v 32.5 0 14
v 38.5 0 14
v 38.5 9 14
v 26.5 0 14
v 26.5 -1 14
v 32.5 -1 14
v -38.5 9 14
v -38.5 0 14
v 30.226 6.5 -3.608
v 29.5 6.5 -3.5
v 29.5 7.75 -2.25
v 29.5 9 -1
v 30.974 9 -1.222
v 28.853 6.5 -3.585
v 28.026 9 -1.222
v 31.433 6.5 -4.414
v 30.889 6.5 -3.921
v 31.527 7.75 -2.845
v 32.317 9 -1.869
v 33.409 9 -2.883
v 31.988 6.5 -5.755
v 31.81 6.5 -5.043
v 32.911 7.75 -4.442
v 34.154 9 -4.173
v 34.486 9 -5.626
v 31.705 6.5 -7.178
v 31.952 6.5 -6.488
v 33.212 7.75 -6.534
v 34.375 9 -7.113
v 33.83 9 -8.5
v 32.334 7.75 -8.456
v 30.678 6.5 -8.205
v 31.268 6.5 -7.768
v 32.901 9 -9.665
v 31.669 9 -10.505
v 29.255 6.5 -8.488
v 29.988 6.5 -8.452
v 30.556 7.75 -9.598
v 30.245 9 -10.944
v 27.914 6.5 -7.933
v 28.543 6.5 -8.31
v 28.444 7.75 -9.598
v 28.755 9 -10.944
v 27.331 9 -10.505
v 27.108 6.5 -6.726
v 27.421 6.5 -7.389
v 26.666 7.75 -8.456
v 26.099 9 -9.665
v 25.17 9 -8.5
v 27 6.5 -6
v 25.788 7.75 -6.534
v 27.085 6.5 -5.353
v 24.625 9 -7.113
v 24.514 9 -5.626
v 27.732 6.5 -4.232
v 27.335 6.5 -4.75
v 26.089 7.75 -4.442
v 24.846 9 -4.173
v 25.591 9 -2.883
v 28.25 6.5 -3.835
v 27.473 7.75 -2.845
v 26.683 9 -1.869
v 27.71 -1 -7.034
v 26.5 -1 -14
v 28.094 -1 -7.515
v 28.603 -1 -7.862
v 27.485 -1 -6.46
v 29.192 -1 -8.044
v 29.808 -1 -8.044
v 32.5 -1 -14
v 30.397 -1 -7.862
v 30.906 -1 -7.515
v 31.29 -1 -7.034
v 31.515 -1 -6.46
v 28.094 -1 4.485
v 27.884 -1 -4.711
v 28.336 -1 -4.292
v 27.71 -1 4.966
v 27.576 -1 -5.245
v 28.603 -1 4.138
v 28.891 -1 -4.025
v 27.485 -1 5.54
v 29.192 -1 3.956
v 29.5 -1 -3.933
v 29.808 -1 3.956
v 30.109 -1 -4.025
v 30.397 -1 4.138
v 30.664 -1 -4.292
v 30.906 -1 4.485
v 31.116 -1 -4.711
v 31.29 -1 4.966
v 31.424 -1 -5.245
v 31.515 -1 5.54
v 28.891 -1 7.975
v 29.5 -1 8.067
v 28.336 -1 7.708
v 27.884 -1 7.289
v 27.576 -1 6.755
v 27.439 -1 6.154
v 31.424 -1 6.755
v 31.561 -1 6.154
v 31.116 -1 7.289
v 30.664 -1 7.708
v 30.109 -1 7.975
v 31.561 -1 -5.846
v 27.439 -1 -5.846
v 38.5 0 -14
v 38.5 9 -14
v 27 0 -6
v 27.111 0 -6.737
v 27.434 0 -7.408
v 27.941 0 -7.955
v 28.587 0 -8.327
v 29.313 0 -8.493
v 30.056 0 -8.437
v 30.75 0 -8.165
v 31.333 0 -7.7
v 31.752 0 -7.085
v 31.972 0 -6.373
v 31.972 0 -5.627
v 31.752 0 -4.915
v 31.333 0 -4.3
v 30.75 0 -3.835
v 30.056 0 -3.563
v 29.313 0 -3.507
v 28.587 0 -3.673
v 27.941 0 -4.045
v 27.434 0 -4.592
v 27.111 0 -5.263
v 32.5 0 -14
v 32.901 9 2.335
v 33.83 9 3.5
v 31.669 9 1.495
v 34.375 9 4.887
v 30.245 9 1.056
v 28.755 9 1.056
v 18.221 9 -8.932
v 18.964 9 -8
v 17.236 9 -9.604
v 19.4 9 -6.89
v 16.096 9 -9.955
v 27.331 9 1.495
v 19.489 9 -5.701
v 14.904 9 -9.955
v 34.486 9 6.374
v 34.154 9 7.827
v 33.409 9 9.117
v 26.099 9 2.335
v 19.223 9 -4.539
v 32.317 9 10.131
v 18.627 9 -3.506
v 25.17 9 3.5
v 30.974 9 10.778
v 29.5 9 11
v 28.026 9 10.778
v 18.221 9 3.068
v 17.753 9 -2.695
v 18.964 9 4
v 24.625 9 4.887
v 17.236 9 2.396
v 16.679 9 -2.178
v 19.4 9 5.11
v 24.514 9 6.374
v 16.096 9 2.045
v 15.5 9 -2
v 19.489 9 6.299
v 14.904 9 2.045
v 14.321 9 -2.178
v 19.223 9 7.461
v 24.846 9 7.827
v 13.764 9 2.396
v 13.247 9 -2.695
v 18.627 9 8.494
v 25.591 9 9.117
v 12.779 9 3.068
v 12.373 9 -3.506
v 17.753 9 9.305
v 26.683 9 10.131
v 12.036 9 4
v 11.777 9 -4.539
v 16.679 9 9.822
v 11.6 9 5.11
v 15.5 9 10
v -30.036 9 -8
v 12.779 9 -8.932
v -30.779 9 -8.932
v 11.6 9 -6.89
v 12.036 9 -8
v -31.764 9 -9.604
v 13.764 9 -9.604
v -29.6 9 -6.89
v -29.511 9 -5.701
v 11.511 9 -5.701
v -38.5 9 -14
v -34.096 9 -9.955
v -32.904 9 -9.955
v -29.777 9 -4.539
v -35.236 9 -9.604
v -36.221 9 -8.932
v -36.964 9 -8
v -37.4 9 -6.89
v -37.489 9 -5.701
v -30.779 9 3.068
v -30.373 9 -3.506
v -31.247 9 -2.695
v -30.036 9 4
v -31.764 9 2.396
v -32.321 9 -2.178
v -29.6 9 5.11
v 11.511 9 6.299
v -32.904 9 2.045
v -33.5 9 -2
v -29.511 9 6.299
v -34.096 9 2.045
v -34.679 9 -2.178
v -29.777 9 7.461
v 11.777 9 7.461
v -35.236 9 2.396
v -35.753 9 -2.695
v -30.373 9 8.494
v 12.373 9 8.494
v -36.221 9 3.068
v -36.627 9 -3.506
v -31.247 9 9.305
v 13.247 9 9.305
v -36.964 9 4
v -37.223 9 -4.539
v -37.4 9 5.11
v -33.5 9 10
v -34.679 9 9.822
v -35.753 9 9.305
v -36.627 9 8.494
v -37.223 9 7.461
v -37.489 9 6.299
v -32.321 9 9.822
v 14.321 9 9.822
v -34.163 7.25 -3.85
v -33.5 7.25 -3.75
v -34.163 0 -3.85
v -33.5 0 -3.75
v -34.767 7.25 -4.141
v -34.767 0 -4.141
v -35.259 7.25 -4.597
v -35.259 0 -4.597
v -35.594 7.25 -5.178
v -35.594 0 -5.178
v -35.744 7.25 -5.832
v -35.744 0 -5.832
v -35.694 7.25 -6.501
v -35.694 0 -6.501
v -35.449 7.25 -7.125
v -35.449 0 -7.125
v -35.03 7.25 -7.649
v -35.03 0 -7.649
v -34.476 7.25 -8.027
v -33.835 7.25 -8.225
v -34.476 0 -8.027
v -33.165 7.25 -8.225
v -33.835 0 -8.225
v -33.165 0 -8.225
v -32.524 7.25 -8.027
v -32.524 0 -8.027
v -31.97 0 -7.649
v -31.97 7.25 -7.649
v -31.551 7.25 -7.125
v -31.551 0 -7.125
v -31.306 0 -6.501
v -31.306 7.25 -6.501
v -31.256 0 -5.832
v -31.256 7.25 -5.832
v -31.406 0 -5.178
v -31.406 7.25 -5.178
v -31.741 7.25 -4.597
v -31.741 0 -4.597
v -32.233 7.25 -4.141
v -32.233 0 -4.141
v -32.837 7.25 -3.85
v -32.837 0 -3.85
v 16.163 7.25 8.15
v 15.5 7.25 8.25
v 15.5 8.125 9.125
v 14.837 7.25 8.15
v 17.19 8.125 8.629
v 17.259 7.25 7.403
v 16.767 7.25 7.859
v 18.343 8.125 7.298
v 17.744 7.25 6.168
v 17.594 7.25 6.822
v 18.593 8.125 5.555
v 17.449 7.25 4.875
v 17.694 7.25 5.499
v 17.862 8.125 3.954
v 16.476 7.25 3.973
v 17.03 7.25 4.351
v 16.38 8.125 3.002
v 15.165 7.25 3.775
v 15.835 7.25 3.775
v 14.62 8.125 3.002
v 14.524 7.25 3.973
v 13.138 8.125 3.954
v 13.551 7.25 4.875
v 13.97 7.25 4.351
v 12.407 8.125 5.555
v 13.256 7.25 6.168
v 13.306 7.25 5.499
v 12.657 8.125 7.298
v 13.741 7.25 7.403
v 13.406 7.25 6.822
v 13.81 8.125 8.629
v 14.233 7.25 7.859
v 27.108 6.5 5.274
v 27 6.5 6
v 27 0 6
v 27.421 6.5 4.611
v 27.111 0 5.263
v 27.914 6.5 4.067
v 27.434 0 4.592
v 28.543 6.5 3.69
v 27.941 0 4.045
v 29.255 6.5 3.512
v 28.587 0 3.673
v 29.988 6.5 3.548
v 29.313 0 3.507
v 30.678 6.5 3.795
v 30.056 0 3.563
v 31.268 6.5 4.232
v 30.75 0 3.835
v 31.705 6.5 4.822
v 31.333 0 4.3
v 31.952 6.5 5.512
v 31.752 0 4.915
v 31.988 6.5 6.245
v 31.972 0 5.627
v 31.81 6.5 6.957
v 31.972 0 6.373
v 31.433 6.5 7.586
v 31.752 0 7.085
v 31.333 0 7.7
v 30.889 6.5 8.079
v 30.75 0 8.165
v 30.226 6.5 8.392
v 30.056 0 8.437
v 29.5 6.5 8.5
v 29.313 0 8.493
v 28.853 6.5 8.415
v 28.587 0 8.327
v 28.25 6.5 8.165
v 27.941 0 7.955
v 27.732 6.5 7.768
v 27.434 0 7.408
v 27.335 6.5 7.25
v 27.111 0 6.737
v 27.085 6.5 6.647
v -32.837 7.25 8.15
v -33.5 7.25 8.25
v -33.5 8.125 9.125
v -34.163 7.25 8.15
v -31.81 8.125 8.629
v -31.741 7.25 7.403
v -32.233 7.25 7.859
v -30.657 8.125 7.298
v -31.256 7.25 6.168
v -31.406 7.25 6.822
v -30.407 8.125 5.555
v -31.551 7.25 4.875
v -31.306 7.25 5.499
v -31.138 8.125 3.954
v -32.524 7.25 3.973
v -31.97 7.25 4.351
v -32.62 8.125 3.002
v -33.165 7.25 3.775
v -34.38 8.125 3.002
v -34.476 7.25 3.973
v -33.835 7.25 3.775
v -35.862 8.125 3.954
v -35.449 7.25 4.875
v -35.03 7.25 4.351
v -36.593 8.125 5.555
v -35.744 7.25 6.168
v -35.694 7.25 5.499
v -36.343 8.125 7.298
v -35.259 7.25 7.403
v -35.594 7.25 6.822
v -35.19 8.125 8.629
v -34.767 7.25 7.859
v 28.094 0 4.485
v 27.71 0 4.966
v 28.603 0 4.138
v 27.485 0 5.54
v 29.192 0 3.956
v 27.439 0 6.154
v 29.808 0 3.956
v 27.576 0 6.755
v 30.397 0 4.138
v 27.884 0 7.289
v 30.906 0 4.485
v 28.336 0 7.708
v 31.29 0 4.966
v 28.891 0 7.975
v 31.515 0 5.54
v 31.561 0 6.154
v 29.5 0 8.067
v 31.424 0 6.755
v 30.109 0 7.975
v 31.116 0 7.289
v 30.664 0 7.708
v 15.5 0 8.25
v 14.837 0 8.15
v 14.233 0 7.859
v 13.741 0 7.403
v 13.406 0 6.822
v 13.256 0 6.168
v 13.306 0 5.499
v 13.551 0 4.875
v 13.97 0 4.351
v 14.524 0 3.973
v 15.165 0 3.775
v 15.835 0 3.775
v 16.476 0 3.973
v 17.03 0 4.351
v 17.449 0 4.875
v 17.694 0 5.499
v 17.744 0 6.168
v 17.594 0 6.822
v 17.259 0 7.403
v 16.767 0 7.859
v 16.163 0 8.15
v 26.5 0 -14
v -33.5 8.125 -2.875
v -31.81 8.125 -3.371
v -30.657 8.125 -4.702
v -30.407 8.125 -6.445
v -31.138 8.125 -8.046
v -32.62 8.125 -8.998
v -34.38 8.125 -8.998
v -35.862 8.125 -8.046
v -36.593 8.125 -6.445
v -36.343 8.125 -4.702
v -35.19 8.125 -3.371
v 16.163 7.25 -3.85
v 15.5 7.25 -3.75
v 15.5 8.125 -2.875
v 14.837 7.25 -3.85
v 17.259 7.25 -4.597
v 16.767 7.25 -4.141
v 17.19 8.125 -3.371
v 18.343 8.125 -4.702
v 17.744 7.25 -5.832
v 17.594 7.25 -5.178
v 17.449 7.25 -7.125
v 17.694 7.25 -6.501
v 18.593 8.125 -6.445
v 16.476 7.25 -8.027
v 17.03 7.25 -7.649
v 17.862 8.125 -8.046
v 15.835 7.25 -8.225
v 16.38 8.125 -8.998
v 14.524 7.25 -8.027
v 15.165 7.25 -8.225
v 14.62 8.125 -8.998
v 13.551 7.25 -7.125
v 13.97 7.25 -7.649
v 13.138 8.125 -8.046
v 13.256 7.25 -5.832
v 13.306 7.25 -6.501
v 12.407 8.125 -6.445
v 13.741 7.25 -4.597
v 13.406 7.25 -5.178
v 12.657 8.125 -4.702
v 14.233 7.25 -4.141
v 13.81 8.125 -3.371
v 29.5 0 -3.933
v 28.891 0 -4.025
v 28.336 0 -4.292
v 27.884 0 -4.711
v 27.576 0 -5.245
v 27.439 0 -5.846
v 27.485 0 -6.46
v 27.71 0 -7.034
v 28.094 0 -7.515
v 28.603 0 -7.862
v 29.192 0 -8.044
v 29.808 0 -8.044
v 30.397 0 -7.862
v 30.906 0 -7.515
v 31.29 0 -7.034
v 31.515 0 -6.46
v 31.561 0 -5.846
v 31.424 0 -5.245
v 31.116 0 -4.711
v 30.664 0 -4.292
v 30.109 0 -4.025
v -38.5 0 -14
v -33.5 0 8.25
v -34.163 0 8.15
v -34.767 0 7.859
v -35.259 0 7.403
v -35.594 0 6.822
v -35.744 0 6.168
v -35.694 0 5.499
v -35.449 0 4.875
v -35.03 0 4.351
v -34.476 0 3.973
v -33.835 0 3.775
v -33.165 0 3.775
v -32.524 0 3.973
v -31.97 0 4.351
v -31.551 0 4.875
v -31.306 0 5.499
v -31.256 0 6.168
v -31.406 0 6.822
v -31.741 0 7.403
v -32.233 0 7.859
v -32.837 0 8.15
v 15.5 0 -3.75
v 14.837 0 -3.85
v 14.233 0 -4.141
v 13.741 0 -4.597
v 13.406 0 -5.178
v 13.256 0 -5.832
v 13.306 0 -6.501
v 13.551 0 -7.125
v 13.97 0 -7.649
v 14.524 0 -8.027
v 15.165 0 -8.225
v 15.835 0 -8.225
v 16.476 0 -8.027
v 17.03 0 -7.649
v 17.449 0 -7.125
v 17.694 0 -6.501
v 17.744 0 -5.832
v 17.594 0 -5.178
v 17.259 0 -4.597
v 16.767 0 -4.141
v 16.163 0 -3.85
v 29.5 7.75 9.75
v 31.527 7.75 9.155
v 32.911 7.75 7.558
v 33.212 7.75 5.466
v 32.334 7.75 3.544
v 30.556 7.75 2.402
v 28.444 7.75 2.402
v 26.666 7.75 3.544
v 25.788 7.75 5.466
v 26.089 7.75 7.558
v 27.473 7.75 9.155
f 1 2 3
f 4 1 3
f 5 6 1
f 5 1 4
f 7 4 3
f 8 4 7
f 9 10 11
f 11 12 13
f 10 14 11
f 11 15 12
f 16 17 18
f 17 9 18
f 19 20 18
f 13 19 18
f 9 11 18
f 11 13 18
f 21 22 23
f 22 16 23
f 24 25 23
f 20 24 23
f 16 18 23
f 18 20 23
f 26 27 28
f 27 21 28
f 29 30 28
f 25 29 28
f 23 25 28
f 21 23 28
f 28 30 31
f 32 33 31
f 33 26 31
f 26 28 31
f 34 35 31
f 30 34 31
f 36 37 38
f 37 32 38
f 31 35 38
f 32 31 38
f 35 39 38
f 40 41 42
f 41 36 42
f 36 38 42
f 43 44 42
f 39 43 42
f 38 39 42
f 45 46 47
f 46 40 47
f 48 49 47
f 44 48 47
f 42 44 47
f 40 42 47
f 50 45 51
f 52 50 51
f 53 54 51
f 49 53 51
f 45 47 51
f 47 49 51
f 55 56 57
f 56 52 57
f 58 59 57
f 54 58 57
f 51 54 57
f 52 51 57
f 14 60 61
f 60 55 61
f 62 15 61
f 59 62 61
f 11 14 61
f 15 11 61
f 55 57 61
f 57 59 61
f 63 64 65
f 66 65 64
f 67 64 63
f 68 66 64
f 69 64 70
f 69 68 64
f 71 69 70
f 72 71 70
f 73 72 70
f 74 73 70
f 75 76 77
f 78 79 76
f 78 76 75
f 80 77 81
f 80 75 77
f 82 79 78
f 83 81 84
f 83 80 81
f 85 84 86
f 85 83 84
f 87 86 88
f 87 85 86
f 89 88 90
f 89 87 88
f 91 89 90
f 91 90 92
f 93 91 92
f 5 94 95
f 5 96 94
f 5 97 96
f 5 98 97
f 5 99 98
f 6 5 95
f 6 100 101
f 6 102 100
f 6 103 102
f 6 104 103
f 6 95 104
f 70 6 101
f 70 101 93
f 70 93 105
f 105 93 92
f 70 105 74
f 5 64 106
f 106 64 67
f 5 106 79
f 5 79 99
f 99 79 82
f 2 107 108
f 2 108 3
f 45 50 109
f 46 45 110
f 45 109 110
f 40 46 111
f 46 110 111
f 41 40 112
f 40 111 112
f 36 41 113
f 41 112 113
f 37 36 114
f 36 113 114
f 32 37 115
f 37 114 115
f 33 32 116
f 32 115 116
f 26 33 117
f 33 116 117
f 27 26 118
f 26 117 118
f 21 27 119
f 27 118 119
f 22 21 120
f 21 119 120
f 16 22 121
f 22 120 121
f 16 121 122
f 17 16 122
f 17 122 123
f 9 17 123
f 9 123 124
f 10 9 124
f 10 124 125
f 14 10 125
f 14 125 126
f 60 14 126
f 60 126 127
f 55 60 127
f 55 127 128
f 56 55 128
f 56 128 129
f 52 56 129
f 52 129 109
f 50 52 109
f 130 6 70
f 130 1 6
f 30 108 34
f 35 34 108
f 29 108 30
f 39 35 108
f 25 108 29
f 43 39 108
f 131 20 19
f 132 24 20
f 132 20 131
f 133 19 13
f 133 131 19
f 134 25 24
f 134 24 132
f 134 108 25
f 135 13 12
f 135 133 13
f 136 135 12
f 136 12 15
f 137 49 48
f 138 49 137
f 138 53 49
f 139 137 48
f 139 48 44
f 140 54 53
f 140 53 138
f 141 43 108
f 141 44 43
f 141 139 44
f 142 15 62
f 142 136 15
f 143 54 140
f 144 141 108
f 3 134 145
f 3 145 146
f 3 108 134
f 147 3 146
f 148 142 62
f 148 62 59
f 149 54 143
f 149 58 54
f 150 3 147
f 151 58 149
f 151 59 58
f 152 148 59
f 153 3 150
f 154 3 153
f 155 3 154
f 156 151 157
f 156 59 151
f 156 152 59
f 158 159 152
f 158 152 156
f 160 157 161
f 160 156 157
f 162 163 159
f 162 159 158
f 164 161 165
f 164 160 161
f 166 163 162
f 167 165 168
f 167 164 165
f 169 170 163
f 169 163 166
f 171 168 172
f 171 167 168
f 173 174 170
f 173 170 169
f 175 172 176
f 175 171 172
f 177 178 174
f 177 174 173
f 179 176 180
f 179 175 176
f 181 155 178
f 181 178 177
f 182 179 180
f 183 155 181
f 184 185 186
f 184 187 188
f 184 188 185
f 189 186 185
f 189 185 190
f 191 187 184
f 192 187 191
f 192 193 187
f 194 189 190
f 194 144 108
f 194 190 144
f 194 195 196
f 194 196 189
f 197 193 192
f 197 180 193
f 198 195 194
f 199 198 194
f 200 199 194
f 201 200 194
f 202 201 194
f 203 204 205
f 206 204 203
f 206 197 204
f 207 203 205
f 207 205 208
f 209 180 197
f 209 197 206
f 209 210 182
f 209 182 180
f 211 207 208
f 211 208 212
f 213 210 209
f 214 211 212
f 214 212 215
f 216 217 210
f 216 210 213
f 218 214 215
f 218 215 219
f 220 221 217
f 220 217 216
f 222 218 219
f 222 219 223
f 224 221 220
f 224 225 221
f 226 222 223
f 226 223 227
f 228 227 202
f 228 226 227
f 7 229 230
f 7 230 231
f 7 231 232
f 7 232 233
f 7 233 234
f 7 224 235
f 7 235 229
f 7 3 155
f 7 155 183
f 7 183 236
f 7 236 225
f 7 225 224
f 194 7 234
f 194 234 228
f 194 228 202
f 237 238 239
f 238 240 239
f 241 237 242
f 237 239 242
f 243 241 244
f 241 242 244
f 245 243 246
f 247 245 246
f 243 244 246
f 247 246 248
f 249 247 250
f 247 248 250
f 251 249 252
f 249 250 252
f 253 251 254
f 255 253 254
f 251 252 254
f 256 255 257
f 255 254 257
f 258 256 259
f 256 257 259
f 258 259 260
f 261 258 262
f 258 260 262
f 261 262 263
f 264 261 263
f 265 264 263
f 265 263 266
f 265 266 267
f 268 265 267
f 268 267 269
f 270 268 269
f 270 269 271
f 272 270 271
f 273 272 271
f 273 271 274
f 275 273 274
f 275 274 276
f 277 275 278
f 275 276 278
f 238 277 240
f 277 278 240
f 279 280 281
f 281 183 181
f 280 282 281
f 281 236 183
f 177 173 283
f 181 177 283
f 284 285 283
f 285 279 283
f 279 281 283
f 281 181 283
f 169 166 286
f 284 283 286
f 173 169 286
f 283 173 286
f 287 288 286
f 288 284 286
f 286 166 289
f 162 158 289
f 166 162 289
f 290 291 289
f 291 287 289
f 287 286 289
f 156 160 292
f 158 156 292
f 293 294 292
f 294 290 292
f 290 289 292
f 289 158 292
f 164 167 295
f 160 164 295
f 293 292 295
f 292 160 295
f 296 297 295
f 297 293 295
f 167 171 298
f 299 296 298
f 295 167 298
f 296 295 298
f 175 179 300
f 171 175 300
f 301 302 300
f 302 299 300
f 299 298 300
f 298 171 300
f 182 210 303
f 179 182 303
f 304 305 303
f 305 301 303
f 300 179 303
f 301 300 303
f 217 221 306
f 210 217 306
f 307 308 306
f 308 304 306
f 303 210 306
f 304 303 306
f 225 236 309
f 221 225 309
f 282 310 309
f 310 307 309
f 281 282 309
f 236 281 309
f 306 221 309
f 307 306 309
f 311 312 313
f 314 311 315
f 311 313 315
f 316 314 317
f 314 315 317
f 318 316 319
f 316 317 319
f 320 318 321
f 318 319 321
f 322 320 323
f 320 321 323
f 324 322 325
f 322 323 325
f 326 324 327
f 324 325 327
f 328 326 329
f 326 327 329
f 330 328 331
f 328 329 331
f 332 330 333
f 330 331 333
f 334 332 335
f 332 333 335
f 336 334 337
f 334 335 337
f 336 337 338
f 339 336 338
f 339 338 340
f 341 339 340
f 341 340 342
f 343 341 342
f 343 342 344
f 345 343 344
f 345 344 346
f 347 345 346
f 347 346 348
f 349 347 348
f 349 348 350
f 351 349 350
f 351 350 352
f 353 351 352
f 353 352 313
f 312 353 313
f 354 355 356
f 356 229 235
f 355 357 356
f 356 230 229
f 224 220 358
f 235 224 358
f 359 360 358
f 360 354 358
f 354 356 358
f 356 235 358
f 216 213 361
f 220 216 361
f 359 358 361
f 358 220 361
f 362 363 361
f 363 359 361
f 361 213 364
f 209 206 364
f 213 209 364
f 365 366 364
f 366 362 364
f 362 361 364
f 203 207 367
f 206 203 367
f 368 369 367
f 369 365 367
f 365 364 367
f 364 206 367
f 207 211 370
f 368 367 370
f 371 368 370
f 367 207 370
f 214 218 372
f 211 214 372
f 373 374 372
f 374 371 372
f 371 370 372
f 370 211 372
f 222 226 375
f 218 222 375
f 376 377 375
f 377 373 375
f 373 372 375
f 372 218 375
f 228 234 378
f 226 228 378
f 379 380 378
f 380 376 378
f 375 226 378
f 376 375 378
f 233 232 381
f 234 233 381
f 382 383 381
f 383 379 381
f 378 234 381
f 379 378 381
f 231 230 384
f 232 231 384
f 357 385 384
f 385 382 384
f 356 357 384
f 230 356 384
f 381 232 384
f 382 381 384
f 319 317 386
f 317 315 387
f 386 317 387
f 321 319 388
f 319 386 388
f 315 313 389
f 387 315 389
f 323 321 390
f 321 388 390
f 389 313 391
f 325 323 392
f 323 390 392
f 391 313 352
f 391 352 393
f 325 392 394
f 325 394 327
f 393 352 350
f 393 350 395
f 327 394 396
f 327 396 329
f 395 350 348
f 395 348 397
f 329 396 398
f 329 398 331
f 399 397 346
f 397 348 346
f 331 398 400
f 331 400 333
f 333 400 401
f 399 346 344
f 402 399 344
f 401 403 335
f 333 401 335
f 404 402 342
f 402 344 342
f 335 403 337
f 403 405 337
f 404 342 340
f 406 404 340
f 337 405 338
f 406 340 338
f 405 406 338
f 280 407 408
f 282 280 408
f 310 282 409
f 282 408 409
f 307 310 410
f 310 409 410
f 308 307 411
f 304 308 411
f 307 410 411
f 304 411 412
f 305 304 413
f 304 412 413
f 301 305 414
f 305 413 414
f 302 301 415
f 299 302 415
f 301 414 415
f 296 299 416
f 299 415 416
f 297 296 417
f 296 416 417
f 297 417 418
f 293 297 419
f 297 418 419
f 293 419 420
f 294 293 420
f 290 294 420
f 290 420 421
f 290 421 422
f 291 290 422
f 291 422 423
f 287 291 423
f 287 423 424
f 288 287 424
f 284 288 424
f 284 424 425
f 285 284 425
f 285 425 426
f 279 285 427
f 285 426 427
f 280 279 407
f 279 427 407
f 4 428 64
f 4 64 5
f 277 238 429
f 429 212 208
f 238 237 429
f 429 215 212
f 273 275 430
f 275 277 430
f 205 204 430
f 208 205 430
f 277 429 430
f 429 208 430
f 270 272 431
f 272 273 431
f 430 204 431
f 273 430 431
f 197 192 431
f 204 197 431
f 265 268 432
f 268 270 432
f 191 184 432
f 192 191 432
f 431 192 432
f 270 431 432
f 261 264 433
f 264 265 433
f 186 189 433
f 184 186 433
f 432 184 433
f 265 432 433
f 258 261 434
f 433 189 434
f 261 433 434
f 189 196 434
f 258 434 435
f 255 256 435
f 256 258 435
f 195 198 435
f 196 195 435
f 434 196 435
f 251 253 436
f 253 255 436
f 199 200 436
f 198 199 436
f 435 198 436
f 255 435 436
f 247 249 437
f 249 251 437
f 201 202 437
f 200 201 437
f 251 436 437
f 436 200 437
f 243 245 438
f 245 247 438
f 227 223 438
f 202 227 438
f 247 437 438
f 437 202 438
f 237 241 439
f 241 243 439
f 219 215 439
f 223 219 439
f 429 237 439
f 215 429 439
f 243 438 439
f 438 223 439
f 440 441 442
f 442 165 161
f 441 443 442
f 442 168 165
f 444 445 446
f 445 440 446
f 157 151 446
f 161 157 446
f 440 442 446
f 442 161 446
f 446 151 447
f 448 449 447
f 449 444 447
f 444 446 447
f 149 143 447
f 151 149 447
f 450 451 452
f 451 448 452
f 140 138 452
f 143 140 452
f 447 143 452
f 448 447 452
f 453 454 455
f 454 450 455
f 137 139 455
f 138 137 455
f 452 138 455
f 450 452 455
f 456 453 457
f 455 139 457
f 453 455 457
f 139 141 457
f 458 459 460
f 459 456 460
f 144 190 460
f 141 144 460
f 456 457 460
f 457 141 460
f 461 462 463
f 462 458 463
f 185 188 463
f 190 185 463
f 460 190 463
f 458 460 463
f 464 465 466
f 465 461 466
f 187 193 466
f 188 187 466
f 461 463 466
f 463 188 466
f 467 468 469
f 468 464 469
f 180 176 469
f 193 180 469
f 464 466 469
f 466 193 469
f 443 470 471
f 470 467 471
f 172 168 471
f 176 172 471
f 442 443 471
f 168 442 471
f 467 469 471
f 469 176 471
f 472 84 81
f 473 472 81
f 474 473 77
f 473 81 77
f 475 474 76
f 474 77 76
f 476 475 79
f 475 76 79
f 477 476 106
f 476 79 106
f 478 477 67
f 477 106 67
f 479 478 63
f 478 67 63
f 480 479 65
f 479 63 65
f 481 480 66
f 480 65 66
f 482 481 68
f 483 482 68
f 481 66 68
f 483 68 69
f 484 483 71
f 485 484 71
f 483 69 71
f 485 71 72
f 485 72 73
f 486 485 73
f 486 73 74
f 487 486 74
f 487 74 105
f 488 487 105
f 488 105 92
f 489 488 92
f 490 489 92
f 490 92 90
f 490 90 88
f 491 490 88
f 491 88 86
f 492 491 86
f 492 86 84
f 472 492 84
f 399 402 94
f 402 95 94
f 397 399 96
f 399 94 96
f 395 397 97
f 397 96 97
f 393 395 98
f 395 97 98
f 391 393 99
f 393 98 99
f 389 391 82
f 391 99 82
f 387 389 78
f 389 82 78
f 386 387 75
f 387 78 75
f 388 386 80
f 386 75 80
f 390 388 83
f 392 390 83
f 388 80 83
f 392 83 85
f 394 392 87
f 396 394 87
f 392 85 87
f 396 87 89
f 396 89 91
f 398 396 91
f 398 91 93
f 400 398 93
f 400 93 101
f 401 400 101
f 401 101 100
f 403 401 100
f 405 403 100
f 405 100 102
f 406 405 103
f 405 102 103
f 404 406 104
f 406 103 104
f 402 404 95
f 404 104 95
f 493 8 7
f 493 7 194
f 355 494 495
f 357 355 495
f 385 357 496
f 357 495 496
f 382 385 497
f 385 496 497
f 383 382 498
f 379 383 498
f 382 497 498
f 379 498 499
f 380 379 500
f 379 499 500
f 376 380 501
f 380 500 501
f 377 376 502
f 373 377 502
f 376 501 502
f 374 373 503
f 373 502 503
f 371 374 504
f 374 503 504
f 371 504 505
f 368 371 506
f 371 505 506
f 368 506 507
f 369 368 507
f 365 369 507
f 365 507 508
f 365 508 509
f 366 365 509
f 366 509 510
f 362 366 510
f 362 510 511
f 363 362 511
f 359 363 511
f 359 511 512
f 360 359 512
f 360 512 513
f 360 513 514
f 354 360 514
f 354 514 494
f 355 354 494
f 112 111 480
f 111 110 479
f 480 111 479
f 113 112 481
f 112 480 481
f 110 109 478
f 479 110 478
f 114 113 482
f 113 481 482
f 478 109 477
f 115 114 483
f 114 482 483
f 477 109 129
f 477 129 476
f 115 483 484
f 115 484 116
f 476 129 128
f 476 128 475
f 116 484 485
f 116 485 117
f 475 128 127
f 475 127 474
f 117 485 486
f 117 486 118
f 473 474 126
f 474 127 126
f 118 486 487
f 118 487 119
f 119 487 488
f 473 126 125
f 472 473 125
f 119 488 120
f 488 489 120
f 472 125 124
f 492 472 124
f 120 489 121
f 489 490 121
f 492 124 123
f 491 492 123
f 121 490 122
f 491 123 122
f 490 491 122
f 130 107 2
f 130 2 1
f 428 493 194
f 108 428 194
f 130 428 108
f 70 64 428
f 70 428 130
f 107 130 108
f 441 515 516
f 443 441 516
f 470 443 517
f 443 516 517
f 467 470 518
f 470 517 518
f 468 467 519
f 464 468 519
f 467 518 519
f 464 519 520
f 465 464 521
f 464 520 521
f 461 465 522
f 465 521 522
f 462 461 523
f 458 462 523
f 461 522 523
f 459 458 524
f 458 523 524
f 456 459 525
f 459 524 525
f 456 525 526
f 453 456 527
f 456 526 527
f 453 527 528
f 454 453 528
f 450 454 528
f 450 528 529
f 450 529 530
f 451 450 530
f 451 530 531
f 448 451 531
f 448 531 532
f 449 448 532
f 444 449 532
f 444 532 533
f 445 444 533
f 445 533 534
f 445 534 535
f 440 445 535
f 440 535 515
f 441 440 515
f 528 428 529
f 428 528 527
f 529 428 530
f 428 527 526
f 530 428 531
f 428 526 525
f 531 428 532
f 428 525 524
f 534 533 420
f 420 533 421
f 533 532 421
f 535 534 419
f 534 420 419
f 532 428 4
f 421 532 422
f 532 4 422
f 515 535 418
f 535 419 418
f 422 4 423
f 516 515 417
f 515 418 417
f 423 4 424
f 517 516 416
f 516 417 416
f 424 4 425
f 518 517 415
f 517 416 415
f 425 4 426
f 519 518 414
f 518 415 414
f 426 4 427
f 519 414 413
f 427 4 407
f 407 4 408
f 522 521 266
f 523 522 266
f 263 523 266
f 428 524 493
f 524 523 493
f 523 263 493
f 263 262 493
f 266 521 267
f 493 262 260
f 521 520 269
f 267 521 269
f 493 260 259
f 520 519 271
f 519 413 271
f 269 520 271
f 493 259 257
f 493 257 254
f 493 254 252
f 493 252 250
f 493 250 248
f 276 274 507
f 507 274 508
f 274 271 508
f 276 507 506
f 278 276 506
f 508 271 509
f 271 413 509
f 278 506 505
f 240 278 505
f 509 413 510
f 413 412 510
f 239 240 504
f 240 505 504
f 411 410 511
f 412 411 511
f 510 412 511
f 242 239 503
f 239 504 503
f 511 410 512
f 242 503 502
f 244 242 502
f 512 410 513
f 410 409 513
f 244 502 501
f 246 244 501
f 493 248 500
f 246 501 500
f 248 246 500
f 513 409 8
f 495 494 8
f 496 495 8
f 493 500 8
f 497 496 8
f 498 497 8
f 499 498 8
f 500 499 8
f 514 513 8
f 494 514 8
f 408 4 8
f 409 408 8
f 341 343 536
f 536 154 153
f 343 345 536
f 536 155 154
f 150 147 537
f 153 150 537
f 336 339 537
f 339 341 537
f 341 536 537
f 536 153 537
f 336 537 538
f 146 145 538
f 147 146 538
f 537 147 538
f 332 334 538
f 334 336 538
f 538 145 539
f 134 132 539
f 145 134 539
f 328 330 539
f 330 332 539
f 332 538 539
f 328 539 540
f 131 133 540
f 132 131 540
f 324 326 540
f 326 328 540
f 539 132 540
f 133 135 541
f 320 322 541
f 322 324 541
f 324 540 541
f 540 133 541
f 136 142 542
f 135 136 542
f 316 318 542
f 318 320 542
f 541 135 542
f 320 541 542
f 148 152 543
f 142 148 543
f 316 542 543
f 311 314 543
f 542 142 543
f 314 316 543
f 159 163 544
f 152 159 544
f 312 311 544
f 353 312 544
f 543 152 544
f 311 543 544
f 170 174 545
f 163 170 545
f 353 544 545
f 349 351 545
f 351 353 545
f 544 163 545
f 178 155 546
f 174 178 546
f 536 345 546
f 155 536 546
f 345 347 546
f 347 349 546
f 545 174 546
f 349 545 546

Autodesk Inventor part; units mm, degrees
ref_plane "YZ Plane" through (0, 0, 0) normal (1, 0, 0) x (0, 1, 0)
ref_plane "XZ Plane" through (0, 0, 0) normal (0, 1, 0) x (-1, 0, 0)
ref_plane "XY Plane" through (0, 0, 0) normal (0, 0, 1) x (1, 0, 0)
sketch "Boceto1" plane through (0, 0, 0) normal (0, 1, 0) x (-1, 0, 0)
  line L0 (38.5, -14) -> (-38.5, -14)
  line L1 (-38.5, -14) -> (-38.5, 14)
  line L2 (-38.5, 14) -> (38.5, 14)
  line L3 (38.5, 14) -> (38.5, -14)
  circle A0 centre (-29.5, 6) radius 2.5
  circle A1 centre (-29.5, -6) radius 2.5
  point P0 (0, 0)
  point P1 (0, -14)
  point P2 (-38.5, 0)
  dimension "d0" = 5
  dimension "d1" = 9
  dimension "d2" = 77
  dimension "d3" = 28
  dimension "d17" = 8
  dimension "d18" = 5
  dimension "d19" = 12
extrude "Extrusión1" add sketch "Boceto1" along normal blind 9
sketch "Boceto2" plane through (0, 0, 0) normal (0, -1, 0) x (1, 0, 0)
  line L0 (-38.5, 14) -> (38.5, 14) projected
  line L1 (26.5, 14) -> (32.5, 14)
  line L2 (32.5, 14) -> (32.5, -14)
  line L3 (32.5, -14) -> (26.5, -14)
  line L4 (26.5, -14) -> (26.5, 14)
  line L5 (38.5, -14) -> (-38.5, -14) projected
  circle A0 centre (29.5, 6) radius 2.5 projected
  circle A1 centre (29.5, -6) radius 2.5 projected
  point P0 (0, 0)
  point P1 (29.5, 14)
  point P2 (26, 6)
  point P3 (31, 6)
  point P4 (26, -6)
  point P5 (31, -6)
  dimension "d6" = 6
extrude "Extrusión2" add sketch "Boceto2" along normal blind 1 contours L0 L2 L3 L4 | A0 | A1
sketch "Boceto3" plane through (0, 9, 0) normal (0, 1, 0) x (1, 0, 0)
  line L0 (-38.5, 14) -> (-38.5, -14) projected
  circle A0 centre (29.5, 6) radius 2.5 projected
  circle A1 centre (29.5, -6) radius 2.5 projected
  line L1 (38.5, -14) -> (38.5, 14) projected
  line L2 (38.5, 14) -> (-38.5, 14) projected
  line L3 (-38.5, -14) -> (38.5, -14) projected
  point P0 (0, 0)
  point P1 (-33.5, 6)
  point P2 (-33.5, -6)
  point P3 (15.5, -6)
  point P4 (15.5, 6)
  dimension "d9" = 5
  dimension "d25" = 14
hole "Agujero1" at (-33.5, 9, -6) at (-33.5, 9, 6) at (15.5, 9, 6) at (15.5, 9, -6) direction (0, -1, 0) diameter 4.5 end through all countersink diameter 8 countersink angle 90 clearance for "Tornillo para maquinaria de cabeza plana" size "M4" standard "Perfil M métrico ANSI"
sketch "Boceto4" plane through (0, 9, 0) normal (0, 1, 0) x (1, 0, 0)
  circle A0 centre (29.5, 6) radius 2.5 projected
  circle A1 centre (29.5, -6) radius 2.5 projected
  point P0 (0, 0)
hole "Agujero2" at (29.5, 9, -6) at (29.5, 9, 6) direction (0, -1, 0) diameter 4.134 depth 14.2 tip angle 118 countersink diameter 10 countersink angle 90 thread size "M5x0.8" class "6H" standard "ANSI Metric M Profile"
properties part number "Base sujecion centelladora"
